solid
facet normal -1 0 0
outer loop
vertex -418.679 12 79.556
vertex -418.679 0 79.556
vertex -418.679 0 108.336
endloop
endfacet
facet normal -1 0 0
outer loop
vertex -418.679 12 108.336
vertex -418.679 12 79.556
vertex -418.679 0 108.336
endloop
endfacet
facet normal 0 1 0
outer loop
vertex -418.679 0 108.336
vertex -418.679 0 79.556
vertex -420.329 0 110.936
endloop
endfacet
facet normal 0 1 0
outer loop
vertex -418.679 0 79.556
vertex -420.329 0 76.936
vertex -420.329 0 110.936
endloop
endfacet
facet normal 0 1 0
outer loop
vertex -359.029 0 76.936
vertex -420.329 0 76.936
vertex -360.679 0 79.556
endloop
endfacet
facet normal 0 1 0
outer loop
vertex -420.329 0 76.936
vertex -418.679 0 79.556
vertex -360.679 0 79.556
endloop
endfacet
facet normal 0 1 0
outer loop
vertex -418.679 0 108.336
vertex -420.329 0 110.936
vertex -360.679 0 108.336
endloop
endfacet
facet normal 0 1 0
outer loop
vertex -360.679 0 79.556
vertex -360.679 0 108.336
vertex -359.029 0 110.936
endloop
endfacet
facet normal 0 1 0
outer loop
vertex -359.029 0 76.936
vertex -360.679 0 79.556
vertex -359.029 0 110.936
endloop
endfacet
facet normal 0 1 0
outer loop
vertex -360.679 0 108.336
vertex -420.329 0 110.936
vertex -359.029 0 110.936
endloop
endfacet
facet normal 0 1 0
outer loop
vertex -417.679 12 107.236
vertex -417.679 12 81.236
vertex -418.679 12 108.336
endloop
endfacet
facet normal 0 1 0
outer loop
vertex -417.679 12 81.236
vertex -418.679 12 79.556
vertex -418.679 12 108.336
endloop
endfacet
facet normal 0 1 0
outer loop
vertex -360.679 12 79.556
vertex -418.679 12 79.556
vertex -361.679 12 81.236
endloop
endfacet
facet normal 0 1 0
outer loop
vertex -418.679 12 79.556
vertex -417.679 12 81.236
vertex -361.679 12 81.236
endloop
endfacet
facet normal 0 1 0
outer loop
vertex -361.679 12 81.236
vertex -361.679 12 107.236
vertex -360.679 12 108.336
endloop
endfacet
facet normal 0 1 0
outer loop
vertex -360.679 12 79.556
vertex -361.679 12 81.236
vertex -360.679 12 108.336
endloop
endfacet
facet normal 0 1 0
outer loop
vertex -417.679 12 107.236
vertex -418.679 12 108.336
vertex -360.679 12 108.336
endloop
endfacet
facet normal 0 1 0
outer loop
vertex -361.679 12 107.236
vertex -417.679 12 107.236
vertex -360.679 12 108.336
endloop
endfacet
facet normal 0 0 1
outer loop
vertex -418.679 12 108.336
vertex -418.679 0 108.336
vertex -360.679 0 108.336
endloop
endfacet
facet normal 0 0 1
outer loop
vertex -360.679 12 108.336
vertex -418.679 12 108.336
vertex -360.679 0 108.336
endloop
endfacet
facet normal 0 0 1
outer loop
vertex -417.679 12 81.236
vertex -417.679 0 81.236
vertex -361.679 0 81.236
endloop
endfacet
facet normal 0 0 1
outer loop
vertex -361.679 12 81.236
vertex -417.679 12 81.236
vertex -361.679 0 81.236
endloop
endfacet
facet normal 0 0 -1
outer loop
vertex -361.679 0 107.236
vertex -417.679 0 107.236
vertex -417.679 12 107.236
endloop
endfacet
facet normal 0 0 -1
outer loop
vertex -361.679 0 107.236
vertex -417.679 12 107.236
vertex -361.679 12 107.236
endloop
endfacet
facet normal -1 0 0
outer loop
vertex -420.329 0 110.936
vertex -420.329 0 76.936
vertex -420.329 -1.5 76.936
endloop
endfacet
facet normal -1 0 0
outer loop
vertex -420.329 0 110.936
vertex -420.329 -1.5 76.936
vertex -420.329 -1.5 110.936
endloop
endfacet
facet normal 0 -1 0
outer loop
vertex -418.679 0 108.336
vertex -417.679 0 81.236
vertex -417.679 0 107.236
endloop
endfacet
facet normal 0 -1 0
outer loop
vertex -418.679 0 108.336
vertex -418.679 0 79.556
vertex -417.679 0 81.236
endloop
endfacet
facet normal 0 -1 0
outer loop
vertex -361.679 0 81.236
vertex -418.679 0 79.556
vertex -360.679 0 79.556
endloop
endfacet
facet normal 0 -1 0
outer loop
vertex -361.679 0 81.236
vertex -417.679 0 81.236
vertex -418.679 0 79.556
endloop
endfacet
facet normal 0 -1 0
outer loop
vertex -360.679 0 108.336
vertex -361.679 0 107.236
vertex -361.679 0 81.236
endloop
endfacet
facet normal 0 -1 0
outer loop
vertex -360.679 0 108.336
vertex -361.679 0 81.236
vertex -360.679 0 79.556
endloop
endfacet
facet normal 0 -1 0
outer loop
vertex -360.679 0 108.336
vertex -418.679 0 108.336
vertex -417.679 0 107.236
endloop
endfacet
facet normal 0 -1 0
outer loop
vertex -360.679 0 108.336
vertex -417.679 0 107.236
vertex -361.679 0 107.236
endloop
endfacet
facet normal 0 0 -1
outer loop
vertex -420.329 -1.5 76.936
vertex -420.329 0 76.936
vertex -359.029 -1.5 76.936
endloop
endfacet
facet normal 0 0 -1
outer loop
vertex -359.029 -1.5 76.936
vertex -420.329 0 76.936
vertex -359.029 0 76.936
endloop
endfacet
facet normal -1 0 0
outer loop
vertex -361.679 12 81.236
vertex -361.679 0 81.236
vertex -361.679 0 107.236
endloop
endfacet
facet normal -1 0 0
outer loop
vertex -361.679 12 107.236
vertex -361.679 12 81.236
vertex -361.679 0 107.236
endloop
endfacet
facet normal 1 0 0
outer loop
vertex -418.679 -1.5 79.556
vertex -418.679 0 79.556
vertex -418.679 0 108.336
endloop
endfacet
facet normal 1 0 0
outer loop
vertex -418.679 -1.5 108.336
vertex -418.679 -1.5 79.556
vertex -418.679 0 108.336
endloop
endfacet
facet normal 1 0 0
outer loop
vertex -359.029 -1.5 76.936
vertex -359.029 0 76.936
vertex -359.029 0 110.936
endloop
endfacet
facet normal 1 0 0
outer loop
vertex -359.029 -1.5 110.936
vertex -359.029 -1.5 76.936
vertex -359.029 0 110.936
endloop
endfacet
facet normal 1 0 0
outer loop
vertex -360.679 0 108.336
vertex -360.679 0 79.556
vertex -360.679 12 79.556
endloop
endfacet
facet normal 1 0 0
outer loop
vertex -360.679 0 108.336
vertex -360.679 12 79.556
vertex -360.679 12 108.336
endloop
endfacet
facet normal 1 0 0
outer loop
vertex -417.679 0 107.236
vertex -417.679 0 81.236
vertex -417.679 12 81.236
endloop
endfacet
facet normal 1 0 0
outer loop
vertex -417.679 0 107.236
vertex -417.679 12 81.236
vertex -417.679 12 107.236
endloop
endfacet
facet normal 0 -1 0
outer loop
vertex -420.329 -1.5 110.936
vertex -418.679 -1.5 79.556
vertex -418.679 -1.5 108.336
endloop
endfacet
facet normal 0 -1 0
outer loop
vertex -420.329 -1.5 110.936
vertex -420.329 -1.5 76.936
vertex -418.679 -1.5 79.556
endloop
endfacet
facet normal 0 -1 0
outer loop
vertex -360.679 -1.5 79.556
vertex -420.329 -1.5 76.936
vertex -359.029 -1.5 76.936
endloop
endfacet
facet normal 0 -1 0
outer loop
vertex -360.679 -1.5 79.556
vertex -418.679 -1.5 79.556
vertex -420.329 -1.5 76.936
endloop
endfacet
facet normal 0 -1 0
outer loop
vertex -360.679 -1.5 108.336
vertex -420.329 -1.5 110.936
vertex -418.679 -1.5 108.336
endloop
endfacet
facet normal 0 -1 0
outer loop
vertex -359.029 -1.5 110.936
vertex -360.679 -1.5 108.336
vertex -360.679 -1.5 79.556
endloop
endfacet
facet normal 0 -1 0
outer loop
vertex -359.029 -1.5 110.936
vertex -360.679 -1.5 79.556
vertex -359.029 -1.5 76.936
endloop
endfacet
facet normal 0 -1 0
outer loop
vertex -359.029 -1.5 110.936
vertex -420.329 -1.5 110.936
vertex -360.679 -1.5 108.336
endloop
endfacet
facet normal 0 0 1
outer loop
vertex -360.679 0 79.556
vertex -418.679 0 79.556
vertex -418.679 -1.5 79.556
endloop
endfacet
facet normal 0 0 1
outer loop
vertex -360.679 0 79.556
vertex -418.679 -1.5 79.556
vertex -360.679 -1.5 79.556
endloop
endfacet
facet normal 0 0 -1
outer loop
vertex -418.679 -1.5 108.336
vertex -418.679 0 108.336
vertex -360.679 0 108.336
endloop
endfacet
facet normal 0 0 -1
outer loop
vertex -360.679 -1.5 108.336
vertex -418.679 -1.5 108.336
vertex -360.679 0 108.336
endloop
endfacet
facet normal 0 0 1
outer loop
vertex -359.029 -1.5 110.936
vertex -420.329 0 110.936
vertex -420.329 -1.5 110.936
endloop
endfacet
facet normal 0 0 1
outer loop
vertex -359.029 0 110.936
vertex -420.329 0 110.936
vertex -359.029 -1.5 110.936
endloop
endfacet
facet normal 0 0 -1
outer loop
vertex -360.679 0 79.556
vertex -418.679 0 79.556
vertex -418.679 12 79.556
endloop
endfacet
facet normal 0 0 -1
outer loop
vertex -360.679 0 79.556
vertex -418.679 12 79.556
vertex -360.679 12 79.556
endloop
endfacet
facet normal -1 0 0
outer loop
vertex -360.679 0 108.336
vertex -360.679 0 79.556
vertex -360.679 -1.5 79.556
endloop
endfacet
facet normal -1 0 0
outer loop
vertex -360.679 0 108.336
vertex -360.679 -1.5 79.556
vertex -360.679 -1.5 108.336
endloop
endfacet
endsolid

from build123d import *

# Parameters (mm, degrees)
F0_W     = 58
F0_H     = 28.780463
F0_W_2   = 56
F0_H_2   = 26
F1_DEPTH = 12
F0_W_3   = 61.3
F0_H_3   = 34
F2_DEPTH = 1.5


with BuildPart() as f1:
    # F0 (on Front) → F1 (new body)
    with BuildSketch(Plane.XZ):
        with Locations((-389.678915, 93.946087)):
            Rectangle(F0_W, F0_H)
        with Locations((-389.678915, 94.236319)):
            Rectangle(F0_W_2, F0_H_2, mode=Mode.SUBTRACT)
    extrude(amount=-F1_DEPTH)


with BuildPart() as f2:
    # F0 (on Front) → F2 (new body)
    with BuildSketch(Plane.XZ):
        with Locations((-389.678915, 93.936319)):
            Rectangle(F0_W_3, F0_H_3)
        with Locations((-389.678915, 93.946087)):
            Rectangle(F0_W, F0_H, mode=Mode.SUBTRACT)
    extrude(amount=F2_DEPTH)


solid = Compound([f1.part, f2.part])
